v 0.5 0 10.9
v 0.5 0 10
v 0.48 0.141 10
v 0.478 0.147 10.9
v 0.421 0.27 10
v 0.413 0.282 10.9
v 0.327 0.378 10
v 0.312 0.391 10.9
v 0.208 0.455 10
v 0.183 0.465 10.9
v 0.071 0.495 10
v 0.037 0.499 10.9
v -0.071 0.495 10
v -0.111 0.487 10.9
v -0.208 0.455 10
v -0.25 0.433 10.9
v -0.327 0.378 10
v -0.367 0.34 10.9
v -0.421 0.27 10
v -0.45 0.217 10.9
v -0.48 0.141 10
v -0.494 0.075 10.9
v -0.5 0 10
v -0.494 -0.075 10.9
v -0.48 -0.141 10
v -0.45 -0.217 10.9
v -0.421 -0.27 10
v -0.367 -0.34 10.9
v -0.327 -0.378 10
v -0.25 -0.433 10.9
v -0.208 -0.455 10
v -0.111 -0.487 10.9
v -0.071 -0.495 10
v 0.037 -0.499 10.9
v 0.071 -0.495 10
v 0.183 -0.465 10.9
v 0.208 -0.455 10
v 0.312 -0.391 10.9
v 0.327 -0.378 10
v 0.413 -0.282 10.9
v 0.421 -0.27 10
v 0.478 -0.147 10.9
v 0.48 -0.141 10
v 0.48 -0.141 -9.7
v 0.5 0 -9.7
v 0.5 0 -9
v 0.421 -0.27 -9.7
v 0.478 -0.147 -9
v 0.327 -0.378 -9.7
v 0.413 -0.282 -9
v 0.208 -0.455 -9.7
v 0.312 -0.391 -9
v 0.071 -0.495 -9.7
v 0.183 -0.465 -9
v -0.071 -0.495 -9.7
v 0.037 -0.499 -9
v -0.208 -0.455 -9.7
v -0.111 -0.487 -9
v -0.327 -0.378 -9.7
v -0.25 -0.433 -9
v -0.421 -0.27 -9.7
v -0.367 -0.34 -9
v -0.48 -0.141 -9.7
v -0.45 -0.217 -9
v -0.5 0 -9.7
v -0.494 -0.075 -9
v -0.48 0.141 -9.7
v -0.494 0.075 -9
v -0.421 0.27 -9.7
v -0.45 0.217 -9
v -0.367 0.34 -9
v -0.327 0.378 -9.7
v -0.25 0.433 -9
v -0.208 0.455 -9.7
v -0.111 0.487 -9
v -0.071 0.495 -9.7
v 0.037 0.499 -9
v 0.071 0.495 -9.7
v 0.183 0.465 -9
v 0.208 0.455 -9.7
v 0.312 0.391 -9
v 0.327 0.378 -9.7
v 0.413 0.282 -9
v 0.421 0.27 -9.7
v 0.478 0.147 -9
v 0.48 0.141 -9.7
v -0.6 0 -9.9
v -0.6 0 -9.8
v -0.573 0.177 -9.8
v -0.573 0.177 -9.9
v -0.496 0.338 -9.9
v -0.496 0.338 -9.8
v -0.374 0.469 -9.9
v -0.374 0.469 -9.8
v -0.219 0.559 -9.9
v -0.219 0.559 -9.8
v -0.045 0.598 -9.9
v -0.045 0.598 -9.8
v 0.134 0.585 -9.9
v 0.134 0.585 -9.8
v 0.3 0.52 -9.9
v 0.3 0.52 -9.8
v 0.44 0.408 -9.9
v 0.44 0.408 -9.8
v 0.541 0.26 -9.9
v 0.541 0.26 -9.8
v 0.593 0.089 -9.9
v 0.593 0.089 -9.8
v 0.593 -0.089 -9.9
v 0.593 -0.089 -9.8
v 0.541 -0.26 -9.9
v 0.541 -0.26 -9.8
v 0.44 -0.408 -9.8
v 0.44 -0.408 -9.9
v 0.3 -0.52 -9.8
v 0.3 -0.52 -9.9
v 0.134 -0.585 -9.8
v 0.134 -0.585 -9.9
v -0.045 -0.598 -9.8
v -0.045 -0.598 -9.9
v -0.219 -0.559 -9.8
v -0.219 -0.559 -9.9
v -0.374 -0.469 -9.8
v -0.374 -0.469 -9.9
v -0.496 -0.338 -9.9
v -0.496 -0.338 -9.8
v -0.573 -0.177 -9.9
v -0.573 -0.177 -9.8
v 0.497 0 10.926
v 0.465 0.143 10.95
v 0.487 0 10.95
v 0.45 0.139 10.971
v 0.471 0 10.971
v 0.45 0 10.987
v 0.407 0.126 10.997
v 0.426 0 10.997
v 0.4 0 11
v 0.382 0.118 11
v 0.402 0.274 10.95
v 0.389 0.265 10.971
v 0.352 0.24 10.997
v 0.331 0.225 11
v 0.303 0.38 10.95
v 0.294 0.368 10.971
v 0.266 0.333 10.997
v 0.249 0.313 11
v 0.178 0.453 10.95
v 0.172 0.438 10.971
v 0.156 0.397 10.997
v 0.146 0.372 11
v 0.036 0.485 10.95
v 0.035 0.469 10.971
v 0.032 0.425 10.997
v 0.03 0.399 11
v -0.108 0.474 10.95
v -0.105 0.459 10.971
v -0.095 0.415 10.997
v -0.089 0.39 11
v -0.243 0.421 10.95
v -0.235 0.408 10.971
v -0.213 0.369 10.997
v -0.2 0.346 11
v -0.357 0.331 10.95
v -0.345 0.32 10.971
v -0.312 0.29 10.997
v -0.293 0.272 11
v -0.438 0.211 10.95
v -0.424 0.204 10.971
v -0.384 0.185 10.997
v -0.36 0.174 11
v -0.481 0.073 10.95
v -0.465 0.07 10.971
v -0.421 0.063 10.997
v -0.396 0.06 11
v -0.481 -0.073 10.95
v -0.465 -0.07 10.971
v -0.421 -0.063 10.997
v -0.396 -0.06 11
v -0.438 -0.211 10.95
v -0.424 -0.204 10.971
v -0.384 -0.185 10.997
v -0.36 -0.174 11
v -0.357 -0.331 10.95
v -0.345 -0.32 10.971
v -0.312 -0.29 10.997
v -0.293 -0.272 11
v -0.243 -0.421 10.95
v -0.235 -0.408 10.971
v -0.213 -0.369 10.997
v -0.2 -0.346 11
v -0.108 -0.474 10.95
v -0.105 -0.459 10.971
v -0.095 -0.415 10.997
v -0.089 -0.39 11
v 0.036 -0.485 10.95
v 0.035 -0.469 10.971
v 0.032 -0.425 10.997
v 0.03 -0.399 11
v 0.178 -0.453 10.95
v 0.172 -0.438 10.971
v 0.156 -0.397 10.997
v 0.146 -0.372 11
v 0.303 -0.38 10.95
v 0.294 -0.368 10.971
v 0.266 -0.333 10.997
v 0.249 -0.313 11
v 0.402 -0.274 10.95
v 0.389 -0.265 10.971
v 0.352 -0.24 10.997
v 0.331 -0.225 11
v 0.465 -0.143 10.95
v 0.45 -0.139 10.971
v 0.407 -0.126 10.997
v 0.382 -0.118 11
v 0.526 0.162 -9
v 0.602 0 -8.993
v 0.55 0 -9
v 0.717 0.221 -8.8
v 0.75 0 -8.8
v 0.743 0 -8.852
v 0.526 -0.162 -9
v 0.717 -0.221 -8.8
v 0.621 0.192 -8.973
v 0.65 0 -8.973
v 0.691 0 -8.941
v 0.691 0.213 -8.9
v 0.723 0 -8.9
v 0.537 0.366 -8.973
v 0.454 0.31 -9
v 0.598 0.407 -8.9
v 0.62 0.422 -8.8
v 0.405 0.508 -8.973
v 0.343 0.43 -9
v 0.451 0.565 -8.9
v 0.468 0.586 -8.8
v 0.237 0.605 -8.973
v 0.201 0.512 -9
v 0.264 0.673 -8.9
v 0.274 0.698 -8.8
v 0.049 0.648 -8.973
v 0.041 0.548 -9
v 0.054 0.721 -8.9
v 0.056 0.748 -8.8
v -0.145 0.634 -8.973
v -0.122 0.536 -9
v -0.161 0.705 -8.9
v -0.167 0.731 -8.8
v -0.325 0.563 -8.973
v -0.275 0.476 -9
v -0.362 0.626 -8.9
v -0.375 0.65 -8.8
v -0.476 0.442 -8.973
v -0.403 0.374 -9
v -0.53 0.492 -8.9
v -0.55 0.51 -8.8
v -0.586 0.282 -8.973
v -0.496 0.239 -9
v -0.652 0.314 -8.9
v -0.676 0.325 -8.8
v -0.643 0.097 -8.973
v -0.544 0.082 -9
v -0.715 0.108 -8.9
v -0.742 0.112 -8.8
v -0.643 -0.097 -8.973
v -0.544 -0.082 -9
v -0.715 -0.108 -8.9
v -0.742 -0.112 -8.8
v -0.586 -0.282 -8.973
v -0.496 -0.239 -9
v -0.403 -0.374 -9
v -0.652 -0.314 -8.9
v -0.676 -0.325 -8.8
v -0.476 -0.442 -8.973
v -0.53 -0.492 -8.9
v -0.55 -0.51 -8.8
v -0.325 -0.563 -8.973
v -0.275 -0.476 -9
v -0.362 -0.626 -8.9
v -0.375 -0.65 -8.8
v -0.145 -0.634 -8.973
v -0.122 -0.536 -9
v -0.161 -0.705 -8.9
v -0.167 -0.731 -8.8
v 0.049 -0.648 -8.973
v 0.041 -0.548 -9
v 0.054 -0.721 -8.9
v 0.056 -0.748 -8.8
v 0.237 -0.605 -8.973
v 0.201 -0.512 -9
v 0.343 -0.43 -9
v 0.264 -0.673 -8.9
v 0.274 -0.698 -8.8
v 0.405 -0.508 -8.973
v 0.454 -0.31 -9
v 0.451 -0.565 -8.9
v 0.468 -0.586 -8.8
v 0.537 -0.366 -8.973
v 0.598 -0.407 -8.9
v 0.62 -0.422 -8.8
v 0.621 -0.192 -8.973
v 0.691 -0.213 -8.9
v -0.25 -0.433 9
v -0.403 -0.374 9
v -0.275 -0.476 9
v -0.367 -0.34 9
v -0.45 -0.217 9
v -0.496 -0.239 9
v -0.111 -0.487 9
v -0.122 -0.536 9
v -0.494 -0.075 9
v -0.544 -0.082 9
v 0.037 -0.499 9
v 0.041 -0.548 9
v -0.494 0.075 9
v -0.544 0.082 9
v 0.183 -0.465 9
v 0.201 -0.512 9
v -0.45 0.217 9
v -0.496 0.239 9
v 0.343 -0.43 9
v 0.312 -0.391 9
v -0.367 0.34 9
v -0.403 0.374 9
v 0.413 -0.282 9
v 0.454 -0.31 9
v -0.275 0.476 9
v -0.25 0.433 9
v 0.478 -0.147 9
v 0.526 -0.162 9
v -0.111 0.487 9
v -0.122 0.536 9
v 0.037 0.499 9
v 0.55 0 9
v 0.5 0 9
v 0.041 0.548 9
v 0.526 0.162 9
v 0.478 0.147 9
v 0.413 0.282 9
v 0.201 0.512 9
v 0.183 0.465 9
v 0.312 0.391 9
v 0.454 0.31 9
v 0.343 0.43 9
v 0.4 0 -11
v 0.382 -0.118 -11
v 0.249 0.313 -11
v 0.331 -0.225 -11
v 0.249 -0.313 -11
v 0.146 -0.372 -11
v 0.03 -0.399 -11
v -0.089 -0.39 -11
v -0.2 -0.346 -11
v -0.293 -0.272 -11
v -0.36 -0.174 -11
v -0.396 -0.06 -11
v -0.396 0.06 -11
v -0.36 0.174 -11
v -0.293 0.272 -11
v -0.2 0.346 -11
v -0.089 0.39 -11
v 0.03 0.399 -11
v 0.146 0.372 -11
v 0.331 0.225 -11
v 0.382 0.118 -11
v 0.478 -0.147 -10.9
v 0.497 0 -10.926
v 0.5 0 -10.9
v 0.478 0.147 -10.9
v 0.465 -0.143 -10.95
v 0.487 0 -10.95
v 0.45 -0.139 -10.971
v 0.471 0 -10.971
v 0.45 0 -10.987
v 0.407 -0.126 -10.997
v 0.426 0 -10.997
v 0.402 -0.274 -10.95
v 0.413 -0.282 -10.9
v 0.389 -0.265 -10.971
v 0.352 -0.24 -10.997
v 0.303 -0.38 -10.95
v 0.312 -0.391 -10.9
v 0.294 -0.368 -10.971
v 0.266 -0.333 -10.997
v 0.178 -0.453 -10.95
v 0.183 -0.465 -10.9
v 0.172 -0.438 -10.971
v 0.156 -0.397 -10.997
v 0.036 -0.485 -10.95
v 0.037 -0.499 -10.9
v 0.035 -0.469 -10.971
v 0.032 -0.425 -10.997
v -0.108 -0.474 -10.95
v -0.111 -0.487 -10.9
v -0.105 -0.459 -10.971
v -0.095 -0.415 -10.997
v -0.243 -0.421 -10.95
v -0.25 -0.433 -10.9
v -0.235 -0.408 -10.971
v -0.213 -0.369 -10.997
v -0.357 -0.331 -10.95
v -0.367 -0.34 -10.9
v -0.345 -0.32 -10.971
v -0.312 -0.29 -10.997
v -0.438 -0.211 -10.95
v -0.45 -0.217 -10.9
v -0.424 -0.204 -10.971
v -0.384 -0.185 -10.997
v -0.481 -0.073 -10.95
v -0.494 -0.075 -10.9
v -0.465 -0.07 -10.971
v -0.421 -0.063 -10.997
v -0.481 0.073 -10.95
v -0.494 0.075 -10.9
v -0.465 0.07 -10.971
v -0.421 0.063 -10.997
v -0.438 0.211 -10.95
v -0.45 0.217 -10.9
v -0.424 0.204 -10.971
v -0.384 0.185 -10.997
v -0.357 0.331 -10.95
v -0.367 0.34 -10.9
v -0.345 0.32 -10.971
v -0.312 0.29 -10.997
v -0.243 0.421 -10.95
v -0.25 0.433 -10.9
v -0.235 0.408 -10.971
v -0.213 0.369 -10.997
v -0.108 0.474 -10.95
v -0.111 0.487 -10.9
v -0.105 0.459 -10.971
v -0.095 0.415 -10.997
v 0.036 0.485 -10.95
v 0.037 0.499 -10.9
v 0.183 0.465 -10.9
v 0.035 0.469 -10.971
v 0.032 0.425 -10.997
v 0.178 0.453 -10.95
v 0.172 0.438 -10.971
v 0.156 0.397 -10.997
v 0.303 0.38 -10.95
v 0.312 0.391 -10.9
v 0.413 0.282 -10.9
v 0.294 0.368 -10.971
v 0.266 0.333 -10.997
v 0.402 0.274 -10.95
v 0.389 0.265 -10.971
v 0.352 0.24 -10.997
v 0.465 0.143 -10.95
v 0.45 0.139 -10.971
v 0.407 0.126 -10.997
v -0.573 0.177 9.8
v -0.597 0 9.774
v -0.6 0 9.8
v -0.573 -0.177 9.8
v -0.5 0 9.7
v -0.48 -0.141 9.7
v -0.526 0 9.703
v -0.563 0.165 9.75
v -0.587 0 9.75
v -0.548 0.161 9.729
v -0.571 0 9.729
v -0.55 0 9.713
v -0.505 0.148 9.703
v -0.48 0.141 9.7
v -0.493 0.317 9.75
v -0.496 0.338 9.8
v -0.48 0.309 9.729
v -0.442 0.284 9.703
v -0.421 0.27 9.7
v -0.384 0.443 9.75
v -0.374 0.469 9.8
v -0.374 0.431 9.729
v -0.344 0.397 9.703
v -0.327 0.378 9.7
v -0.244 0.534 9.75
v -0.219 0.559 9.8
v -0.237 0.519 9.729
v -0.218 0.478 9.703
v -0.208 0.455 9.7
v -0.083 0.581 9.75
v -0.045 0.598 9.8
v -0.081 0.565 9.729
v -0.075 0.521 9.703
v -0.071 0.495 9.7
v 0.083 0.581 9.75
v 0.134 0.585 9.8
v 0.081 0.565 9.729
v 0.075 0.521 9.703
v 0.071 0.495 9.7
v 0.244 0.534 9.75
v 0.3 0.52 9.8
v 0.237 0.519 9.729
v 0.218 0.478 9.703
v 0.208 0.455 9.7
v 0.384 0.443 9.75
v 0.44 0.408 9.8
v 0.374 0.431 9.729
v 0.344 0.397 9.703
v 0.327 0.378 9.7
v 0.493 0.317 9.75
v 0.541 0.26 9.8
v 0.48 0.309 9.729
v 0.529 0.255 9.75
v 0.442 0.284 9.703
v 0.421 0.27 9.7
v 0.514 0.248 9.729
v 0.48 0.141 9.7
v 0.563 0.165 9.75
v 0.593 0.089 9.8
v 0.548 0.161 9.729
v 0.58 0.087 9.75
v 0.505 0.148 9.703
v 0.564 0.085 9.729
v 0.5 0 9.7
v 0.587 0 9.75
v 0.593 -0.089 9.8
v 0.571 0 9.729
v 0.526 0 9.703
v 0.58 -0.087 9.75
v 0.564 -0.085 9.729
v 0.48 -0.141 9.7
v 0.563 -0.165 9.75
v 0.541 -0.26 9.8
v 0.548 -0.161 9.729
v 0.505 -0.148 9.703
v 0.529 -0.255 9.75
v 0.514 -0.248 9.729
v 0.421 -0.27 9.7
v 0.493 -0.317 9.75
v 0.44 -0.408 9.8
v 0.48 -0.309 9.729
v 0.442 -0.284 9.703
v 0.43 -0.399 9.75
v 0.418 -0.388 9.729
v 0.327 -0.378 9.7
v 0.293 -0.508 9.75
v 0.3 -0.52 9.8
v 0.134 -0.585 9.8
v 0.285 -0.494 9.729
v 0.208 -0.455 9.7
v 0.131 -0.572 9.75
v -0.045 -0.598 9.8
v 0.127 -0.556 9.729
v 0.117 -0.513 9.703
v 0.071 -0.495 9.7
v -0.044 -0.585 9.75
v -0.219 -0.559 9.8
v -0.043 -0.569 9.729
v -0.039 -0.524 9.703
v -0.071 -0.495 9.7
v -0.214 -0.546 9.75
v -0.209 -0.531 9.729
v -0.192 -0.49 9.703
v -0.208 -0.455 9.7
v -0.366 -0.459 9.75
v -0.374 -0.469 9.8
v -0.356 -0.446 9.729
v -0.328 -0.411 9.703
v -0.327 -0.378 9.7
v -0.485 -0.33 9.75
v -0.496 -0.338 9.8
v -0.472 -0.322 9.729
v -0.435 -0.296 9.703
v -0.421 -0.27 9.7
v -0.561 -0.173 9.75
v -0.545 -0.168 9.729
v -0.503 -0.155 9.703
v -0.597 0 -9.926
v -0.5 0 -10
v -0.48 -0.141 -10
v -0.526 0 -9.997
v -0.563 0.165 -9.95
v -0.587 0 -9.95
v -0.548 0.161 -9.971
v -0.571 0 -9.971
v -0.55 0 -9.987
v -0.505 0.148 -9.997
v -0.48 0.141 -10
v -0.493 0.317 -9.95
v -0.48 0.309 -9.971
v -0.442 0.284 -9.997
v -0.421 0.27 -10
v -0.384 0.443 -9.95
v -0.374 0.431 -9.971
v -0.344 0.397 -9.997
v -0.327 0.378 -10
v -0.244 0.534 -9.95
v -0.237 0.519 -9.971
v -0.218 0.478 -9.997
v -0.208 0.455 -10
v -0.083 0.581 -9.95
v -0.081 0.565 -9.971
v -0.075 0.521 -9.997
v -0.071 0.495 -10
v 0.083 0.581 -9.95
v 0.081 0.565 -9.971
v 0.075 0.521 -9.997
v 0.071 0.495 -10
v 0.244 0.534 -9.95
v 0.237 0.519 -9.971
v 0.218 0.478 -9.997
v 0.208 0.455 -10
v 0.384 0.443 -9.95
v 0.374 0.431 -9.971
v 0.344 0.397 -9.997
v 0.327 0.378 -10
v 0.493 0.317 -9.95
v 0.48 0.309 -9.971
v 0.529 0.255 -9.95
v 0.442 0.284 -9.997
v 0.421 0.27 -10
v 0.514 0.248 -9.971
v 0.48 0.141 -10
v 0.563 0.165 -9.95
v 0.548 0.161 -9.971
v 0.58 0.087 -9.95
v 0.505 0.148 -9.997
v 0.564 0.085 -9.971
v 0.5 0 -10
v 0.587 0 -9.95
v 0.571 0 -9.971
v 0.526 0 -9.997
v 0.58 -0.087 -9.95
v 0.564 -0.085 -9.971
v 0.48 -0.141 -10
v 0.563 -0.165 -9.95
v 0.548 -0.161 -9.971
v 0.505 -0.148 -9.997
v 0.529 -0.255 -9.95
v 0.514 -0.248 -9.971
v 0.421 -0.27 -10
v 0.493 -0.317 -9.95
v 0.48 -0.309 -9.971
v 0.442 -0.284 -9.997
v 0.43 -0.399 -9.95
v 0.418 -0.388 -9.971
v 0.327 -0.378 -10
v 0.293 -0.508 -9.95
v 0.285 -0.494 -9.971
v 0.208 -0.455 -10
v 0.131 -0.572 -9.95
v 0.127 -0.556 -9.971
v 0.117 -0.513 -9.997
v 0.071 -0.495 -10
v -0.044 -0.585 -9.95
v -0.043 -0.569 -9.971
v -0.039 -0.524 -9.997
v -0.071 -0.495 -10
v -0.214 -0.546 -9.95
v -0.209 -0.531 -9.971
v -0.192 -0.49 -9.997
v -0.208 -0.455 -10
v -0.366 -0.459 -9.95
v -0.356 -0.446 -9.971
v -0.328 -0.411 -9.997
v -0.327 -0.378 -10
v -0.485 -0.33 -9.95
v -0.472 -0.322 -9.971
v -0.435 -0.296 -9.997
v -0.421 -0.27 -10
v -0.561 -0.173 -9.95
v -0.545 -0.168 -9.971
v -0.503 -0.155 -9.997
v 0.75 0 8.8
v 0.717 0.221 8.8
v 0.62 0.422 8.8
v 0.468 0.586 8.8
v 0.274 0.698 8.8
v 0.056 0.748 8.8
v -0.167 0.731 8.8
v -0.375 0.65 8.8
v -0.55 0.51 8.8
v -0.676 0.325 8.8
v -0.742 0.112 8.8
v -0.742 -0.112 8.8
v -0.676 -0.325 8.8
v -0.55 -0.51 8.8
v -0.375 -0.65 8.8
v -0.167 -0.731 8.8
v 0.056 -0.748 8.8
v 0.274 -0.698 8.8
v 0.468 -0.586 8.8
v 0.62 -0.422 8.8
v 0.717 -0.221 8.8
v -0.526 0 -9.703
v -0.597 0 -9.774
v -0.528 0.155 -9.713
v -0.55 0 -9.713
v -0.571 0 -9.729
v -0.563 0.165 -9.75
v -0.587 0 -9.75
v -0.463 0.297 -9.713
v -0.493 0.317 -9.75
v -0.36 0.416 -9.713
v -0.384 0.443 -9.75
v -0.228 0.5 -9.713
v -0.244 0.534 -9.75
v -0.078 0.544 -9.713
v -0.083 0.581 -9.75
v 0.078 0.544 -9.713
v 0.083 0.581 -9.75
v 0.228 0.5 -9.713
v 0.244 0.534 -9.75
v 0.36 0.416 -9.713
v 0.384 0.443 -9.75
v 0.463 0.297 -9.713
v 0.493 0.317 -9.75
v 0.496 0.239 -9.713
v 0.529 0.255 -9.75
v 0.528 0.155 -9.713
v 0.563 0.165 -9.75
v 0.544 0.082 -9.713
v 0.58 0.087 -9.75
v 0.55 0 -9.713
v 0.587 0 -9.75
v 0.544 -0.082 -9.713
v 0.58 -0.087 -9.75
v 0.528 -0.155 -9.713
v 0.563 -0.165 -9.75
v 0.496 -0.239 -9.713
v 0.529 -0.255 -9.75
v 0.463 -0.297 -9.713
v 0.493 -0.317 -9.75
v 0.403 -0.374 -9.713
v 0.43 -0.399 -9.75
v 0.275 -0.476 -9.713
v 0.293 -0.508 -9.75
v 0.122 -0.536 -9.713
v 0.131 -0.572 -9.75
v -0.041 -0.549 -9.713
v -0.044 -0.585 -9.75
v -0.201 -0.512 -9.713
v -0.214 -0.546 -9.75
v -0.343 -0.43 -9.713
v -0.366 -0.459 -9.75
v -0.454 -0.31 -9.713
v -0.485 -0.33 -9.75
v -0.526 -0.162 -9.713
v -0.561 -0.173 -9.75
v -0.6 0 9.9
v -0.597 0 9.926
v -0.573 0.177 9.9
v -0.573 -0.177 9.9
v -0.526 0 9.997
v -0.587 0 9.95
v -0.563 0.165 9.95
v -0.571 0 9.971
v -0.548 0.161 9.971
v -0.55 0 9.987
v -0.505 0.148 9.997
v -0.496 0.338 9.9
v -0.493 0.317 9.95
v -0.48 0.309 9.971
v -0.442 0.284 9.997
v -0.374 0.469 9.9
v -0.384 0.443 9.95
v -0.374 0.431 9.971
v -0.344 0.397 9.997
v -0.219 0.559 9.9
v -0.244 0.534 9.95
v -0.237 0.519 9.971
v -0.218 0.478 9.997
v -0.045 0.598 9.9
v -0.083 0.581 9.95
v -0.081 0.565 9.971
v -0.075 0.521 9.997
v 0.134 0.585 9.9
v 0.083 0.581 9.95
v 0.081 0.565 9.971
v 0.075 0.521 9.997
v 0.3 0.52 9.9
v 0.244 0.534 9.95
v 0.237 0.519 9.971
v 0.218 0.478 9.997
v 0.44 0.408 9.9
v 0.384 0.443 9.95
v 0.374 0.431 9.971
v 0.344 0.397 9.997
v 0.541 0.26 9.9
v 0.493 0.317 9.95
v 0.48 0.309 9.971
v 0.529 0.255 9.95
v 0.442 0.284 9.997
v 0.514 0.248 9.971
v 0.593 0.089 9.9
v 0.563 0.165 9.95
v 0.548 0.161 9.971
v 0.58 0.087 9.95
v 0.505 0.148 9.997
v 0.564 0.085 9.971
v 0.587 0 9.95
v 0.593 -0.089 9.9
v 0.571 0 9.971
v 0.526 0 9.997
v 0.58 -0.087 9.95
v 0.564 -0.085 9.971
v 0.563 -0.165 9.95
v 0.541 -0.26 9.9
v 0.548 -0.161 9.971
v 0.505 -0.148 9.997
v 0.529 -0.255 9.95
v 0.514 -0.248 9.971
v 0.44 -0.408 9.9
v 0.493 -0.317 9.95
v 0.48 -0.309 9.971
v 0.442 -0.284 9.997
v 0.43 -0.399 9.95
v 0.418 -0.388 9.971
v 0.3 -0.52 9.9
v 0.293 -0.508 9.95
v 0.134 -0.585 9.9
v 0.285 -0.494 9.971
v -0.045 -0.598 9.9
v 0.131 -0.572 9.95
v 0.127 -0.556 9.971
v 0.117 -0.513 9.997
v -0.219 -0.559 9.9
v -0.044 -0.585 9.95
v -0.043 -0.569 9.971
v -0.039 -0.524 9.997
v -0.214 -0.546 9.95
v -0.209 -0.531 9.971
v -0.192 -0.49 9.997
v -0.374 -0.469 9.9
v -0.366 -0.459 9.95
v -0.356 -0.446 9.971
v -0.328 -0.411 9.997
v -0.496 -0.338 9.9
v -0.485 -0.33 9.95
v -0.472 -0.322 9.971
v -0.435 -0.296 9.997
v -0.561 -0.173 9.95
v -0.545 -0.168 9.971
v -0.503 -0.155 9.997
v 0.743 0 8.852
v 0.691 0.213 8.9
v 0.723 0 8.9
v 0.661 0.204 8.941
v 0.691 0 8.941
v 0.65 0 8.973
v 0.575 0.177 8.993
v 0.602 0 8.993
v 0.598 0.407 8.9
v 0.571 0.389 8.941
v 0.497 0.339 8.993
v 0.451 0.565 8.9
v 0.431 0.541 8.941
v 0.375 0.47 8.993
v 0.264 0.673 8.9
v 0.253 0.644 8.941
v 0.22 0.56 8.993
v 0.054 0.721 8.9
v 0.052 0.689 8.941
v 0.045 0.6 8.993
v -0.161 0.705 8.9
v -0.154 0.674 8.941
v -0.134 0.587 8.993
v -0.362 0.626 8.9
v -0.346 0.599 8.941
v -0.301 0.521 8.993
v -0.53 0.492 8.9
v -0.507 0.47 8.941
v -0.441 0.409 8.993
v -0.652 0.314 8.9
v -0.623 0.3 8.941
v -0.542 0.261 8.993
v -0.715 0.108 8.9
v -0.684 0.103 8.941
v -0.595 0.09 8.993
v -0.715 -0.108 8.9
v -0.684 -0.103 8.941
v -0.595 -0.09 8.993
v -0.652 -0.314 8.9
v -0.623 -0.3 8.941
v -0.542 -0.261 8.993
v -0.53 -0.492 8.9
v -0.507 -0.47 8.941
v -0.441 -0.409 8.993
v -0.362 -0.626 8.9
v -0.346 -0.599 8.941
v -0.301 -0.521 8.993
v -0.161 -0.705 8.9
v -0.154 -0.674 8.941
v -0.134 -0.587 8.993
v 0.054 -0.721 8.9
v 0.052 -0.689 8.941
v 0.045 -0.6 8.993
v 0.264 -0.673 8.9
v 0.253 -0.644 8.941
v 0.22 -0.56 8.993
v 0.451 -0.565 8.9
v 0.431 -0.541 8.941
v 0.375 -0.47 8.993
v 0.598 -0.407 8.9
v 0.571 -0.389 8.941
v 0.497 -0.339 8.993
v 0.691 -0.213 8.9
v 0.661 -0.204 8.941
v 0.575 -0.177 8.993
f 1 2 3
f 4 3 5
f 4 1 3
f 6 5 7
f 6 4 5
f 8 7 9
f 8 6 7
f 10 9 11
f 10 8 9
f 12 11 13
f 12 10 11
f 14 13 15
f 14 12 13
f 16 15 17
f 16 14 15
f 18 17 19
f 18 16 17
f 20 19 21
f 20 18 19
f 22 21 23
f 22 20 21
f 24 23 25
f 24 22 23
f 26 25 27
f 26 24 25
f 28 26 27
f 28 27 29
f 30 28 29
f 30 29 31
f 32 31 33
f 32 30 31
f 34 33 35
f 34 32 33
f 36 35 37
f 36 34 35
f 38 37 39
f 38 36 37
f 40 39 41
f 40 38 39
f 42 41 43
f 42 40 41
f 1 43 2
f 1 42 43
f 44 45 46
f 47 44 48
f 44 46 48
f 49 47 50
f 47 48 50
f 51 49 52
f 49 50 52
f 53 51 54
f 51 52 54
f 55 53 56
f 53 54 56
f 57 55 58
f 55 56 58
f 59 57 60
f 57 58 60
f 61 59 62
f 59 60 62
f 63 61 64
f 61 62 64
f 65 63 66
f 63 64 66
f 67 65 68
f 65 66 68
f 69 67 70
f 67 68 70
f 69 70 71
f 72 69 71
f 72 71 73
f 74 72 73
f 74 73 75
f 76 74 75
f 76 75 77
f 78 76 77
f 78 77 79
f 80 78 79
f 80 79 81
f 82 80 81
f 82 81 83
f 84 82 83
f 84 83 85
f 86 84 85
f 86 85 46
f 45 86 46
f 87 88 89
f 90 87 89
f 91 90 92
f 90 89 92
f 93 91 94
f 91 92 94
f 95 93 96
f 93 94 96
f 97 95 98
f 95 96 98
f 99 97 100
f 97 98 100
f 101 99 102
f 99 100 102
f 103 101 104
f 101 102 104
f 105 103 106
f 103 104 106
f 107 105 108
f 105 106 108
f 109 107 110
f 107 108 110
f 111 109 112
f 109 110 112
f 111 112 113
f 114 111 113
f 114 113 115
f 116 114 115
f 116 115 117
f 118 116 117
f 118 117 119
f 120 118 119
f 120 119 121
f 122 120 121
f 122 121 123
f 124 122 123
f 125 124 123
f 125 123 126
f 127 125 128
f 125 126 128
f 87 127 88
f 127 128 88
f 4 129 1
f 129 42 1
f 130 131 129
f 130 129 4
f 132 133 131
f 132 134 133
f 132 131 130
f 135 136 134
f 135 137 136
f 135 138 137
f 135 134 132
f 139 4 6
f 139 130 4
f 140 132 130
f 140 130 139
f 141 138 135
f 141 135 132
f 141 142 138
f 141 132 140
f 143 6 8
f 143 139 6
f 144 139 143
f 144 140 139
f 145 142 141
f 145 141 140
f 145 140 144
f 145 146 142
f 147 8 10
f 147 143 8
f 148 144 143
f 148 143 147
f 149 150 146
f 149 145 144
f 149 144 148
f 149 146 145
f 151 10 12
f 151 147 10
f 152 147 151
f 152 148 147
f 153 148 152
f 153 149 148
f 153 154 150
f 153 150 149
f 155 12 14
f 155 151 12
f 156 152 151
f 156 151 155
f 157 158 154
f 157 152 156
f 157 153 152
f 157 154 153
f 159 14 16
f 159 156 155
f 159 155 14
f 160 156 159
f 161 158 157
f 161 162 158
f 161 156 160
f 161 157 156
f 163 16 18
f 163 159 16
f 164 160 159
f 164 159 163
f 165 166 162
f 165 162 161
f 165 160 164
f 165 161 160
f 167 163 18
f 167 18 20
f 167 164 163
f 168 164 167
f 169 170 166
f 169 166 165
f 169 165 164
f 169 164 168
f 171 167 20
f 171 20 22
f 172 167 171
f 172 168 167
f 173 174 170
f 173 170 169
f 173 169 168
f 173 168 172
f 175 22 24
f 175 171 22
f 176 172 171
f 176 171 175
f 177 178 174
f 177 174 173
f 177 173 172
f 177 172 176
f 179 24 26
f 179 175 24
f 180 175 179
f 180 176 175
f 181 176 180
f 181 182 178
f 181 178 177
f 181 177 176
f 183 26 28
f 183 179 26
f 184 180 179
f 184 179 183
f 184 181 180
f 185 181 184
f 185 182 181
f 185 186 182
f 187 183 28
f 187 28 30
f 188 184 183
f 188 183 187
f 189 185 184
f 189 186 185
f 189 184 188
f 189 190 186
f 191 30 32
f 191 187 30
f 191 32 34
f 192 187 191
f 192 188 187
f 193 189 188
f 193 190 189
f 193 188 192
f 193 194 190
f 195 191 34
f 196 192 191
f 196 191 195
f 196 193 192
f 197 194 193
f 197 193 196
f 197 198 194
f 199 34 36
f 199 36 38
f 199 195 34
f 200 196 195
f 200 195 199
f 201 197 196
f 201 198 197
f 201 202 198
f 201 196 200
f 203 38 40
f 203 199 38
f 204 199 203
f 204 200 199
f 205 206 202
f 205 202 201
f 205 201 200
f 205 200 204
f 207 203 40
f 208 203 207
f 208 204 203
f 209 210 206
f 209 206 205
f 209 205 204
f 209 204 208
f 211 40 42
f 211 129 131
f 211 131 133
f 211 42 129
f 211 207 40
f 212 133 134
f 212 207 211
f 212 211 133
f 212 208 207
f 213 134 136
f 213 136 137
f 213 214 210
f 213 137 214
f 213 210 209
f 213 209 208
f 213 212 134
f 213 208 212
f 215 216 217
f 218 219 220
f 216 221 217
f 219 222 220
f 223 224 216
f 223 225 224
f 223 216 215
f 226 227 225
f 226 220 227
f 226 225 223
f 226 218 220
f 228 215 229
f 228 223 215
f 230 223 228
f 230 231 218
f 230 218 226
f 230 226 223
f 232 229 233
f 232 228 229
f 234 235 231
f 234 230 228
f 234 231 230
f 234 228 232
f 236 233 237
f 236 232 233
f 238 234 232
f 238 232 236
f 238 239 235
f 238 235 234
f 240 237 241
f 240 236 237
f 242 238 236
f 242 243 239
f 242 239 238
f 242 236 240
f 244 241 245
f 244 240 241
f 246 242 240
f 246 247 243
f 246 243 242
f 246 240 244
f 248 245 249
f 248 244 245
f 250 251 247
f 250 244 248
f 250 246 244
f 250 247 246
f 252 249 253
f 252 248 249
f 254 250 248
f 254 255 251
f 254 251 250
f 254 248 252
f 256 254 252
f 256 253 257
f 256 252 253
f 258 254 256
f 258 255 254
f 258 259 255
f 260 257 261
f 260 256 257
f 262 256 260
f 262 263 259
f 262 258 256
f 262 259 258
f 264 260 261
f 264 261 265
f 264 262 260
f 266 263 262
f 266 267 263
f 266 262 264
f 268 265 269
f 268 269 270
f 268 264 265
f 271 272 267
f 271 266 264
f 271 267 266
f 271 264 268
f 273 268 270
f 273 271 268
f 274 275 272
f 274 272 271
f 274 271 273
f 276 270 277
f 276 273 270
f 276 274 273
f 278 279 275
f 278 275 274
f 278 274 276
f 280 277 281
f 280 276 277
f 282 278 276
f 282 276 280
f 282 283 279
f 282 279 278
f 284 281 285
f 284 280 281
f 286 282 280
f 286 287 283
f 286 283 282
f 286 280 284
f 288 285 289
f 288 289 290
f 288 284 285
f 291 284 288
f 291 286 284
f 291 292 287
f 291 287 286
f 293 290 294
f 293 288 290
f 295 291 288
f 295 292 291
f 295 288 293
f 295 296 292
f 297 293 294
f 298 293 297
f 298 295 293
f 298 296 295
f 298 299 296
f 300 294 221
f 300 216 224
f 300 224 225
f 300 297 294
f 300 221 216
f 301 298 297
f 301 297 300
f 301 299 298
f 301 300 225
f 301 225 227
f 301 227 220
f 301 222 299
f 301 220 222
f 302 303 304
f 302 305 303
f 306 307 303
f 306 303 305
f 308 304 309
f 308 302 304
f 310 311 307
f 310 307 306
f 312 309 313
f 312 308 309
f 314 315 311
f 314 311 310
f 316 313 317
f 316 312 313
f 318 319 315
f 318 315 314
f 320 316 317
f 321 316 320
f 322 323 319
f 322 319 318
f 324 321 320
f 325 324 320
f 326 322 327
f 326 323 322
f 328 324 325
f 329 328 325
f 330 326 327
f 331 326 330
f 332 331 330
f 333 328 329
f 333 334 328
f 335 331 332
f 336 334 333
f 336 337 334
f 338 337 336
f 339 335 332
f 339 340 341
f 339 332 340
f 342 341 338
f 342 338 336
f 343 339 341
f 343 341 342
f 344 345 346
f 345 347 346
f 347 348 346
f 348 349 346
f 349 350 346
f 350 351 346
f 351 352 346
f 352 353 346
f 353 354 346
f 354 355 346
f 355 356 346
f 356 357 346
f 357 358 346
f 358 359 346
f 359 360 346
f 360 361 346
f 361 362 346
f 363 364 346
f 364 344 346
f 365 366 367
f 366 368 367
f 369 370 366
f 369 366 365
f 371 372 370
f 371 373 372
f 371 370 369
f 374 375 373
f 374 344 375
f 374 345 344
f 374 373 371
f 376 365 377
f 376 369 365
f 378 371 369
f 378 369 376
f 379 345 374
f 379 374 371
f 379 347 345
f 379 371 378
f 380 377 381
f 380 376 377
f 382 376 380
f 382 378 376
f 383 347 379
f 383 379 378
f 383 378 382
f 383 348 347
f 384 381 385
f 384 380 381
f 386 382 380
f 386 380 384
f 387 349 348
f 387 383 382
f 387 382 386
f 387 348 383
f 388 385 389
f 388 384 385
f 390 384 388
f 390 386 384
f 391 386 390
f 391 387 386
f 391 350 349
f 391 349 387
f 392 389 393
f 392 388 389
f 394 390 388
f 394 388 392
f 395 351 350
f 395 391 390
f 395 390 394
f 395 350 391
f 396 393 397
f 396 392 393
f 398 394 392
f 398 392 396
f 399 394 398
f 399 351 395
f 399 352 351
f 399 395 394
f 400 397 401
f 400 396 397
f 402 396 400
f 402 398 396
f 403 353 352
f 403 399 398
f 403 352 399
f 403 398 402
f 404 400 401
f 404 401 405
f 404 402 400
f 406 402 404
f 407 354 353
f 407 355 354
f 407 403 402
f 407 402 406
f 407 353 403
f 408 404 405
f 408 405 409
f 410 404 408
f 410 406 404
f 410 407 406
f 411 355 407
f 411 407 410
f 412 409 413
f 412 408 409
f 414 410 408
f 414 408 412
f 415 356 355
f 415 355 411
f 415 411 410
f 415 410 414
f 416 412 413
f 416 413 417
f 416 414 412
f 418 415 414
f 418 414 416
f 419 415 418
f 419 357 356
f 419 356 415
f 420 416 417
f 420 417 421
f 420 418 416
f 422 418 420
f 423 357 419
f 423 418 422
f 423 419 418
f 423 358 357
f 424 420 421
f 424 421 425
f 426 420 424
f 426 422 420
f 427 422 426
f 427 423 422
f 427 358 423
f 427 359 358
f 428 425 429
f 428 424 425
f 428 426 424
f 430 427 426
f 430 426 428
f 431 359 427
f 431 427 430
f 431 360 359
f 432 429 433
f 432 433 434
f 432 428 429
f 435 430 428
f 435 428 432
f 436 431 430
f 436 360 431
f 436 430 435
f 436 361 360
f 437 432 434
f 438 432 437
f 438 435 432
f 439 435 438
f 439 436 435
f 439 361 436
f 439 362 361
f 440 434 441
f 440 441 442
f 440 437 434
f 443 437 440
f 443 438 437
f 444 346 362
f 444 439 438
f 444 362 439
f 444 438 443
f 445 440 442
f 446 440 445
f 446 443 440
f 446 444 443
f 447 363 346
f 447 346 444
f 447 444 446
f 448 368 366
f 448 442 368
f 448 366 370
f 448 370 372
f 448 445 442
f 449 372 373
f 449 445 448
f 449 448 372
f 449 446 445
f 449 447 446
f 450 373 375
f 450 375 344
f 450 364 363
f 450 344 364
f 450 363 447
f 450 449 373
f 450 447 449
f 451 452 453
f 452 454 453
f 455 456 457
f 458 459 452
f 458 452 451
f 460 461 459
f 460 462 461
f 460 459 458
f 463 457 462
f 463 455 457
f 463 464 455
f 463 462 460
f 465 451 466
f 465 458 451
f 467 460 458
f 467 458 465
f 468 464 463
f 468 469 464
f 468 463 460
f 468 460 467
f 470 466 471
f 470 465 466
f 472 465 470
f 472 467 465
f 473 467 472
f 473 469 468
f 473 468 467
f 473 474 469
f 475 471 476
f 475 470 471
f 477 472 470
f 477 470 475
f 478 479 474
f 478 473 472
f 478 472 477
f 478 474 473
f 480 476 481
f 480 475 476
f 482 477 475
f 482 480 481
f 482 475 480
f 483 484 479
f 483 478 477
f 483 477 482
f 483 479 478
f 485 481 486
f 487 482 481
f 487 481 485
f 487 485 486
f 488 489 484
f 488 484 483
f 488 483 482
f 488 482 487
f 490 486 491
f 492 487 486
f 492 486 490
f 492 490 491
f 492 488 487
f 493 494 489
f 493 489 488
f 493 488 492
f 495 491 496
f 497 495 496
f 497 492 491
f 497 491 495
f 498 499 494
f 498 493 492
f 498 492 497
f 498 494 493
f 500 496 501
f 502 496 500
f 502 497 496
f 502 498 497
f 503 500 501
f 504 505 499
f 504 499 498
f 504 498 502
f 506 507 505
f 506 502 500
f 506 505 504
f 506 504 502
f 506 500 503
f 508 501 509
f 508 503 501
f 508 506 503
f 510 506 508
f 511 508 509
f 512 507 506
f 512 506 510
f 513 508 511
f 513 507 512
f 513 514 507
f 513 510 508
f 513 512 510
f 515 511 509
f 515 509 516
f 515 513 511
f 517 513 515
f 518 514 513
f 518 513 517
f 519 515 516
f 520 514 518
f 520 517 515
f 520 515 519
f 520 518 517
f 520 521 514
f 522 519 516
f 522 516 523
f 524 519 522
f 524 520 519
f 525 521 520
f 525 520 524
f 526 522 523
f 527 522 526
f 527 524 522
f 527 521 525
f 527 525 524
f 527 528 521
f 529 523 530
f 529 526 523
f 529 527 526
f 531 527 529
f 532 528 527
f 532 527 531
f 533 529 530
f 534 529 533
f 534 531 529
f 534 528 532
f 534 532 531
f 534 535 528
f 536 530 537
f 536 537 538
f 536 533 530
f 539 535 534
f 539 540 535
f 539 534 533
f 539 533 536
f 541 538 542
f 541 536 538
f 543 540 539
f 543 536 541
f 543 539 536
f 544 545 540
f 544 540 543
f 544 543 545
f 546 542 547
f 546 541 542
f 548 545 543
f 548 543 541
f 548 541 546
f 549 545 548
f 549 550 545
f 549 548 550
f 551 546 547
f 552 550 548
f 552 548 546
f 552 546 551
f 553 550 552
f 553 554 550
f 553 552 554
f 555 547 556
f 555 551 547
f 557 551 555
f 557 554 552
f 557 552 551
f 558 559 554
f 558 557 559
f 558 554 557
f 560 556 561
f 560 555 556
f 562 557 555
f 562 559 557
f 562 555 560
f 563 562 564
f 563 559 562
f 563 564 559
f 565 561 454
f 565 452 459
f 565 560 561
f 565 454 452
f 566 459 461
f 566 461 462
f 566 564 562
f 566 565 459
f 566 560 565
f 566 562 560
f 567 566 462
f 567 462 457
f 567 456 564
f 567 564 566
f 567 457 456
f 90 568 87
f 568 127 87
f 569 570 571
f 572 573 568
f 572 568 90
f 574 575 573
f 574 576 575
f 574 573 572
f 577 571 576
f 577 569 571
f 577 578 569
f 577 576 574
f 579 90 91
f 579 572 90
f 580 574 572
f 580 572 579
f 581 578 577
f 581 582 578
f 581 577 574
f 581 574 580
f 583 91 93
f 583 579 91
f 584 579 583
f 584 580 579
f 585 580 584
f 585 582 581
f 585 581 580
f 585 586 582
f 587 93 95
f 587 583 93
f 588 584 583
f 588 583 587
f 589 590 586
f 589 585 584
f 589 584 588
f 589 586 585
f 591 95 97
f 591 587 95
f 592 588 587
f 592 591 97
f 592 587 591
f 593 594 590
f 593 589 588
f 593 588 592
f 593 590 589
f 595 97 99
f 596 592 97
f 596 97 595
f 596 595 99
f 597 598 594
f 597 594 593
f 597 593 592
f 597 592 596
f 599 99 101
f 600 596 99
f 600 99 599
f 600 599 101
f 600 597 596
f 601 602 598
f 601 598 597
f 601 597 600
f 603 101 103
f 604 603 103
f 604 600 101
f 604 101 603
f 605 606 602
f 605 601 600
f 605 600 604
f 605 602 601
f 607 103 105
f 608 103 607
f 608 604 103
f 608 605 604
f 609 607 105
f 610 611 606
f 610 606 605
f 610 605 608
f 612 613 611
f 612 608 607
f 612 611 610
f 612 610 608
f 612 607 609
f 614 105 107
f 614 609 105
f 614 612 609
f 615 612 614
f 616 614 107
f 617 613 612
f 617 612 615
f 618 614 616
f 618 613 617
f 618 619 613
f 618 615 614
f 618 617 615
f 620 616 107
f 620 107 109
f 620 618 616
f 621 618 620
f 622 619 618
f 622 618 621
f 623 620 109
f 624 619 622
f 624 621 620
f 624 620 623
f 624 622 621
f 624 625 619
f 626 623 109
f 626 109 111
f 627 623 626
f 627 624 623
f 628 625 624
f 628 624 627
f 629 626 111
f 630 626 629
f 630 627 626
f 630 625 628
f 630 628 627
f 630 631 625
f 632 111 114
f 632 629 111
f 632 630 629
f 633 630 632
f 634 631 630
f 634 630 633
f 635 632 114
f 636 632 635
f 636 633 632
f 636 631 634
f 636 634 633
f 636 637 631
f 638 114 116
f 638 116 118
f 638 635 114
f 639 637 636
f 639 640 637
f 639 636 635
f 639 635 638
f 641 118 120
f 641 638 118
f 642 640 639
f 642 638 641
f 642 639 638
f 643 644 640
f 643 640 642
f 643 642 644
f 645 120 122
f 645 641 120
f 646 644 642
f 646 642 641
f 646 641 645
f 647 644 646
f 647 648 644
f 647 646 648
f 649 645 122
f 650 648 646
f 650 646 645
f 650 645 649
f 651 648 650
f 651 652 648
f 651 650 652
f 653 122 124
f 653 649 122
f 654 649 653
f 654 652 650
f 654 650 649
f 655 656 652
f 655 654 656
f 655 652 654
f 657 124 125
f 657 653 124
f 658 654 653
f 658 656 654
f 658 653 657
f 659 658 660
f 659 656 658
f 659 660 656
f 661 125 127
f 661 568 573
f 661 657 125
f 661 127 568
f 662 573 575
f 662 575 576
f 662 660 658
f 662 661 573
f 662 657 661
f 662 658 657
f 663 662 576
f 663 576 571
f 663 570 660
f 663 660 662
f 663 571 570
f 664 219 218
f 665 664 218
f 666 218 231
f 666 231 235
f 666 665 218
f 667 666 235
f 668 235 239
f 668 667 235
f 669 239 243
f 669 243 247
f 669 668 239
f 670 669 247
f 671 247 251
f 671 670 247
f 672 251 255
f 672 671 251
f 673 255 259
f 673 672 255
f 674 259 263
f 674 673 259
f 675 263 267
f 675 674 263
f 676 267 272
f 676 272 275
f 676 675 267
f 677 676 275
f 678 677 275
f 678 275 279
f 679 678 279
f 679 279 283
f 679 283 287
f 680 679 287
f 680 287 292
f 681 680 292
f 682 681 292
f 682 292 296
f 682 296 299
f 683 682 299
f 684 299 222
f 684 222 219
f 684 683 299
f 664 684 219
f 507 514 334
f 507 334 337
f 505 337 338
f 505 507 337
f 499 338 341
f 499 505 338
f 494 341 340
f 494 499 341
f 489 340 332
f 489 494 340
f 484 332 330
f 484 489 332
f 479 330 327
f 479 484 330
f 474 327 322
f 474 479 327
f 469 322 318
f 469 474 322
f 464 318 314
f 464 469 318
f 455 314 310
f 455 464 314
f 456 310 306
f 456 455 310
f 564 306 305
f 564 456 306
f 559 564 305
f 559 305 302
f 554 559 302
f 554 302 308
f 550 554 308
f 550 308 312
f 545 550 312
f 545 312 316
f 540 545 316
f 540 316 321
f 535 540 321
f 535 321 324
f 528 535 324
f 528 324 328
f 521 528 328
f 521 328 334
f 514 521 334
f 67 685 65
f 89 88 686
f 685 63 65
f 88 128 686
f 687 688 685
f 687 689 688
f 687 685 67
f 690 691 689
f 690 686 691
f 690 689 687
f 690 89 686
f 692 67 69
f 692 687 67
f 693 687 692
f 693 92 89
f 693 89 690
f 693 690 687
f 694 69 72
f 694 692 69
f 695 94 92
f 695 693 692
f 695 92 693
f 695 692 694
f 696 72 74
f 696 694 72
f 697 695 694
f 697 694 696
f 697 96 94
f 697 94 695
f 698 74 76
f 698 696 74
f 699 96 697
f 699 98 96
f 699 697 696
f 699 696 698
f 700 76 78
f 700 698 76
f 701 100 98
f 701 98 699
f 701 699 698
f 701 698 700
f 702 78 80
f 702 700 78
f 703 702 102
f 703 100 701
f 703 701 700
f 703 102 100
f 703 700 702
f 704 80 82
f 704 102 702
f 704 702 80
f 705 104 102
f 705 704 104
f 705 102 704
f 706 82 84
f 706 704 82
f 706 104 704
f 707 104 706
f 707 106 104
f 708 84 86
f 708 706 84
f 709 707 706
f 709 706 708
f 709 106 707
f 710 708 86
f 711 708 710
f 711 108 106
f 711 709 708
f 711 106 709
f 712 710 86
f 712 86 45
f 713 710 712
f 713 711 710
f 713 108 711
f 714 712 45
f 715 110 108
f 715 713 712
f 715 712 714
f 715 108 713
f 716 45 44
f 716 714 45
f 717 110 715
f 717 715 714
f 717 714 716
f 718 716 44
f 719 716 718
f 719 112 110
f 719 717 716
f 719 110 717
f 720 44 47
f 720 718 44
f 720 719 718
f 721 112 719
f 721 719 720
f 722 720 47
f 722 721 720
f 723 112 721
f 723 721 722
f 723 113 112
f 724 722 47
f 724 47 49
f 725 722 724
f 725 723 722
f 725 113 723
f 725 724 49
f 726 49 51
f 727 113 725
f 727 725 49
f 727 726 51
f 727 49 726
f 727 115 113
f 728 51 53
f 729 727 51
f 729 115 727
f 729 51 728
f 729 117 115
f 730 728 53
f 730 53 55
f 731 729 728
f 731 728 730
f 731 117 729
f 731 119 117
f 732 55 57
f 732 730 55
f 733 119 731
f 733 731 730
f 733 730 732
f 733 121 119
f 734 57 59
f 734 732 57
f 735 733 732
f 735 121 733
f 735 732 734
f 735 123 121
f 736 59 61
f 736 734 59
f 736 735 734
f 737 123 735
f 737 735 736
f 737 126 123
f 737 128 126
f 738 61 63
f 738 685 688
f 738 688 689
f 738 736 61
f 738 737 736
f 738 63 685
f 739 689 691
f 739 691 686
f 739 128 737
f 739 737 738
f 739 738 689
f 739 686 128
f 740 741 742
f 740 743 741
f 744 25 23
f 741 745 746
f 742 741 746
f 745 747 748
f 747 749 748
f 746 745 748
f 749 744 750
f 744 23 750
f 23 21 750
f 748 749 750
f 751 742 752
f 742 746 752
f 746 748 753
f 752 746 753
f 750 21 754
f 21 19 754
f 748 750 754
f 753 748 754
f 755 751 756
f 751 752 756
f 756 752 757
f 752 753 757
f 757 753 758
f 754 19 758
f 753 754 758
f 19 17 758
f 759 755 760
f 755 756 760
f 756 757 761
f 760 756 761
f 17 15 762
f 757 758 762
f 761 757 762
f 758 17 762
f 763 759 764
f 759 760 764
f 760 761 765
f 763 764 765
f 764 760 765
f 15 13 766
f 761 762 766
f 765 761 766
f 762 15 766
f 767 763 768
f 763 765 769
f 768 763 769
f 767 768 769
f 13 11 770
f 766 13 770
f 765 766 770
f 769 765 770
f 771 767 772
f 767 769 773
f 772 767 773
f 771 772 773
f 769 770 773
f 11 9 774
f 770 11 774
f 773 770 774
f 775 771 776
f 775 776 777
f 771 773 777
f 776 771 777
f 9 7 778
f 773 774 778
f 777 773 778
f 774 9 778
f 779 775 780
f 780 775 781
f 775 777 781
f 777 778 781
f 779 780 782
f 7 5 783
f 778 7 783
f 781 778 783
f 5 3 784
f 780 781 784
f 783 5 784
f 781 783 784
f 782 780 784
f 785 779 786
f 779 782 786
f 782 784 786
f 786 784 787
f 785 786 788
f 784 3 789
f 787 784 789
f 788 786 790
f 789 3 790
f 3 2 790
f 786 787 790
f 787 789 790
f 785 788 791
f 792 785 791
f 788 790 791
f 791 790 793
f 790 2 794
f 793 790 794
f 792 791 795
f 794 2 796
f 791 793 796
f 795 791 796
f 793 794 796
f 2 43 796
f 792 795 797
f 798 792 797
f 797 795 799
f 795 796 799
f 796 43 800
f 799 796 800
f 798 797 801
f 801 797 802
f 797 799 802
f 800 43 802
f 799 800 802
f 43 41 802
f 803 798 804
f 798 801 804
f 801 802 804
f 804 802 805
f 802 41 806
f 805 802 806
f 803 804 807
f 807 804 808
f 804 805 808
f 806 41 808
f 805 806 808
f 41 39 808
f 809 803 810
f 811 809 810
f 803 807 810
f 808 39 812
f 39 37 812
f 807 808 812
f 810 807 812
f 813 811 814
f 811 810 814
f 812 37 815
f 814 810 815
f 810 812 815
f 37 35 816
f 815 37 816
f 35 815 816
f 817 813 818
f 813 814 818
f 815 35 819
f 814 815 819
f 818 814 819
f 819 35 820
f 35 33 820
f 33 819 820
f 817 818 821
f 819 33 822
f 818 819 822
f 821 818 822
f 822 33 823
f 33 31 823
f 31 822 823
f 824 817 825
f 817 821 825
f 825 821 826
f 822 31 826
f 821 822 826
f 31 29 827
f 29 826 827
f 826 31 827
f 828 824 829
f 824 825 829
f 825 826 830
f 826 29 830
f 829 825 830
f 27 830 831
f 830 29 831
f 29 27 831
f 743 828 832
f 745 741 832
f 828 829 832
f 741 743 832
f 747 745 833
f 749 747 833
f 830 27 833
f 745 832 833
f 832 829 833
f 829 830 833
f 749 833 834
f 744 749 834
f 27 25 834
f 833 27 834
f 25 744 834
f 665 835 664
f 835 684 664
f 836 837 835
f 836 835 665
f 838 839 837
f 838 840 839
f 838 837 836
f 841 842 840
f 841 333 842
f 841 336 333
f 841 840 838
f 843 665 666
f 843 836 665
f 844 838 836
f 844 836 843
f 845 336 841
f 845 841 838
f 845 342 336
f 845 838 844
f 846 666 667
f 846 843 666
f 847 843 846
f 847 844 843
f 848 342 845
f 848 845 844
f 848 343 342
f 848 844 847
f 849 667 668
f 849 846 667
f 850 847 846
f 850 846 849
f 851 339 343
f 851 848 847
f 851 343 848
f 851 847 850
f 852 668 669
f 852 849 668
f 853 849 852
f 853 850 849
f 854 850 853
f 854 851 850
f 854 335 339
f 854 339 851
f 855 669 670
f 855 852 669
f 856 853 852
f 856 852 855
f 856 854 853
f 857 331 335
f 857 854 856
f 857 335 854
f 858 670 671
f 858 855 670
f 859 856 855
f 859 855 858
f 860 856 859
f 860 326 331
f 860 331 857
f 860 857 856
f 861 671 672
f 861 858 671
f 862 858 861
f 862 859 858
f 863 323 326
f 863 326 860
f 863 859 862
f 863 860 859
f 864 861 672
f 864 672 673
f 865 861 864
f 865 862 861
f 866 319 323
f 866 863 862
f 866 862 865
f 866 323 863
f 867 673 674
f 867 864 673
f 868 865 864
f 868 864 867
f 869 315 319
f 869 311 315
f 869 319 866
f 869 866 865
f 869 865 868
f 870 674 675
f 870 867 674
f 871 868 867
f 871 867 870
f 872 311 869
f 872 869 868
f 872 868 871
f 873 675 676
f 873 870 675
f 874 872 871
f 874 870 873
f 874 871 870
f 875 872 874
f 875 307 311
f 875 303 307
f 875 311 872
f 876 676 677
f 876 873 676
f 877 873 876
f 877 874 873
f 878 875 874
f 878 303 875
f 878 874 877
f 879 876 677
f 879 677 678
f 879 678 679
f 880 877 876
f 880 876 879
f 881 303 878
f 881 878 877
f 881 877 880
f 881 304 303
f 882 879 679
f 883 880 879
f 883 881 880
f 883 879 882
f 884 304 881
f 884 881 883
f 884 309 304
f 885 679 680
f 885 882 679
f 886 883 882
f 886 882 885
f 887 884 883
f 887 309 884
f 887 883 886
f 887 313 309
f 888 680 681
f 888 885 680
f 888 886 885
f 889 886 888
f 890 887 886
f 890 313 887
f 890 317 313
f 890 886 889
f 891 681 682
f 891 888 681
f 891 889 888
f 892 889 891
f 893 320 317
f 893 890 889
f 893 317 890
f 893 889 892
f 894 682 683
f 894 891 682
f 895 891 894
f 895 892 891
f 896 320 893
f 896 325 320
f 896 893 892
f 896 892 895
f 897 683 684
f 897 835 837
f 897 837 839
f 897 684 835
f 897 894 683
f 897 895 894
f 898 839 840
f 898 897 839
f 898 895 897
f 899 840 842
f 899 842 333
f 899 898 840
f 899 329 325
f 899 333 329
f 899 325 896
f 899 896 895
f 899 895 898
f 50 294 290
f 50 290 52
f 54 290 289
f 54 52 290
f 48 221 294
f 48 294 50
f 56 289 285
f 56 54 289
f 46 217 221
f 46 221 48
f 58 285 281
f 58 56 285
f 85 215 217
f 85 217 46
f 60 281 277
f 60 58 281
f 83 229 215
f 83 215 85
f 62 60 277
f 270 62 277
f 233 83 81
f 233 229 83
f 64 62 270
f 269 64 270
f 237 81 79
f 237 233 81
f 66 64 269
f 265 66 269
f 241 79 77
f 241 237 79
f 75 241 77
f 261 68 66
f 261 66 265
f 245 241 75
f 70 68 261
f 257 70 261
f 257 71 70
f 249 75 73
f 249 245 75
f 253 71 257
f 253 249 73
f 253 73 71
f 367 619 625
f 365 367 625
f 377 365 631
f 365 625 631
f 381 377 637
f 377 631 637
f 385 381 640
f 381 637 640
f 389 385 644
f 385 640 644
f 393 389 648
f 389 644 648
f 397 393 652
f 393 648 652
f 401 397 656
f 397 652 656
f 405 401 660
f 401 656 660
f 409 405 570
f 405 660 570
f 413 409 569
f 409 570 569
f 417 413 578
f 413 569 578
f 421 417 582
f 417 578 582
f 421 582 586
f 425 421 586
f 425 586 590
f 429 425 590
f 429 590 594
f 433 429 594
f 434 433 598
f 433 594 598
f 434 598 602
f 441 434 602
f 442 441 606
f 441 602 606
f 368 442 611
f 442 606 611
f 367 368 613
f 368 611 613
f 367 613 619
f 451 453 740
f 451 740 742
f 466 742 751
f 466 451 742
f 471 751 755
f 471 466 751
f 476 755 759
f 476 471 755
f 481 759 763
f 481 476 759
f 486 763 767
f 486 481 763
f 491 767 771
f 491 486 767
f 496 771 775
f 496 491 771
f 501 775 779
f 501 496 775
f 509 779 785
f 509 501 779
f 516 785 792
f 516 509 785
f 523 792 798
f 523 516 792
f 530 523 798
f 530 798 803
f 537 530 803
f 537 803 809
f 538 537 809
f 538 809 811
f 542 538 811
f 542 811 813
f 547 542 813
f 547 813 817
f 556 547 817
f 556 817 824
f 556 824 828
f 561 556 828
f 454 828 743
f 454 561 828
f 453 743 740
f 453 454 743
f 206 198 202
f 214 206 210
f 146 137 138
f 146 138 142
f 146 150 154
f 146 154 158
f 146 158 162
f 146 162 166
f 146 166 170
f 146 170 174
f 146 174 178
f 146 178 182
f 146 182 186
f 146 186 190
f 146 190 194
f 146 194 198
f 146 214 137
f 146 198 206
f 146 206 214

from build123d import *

# Parameters (mm, degrees)
SKETCH1_R           = 0.75
BOSS_EXTRUDE1_DEPTH = 11
SKETCH2_R           = 1.389423691
SKETCH2_R_2         = 0.5
CUT_EXTRUDE1_DEPTH  = 2
CUT_EXTRUDE2_START  = -2
SKETCH3_R           = 1.153055404
SKETCH3_R_2         = 0.5
CUT_EXTRUDE2_DEPTH  = 2
BOSS_EXTRUDE2_START = -1.3
SKETCH4_R           = 0.6
SKETCH4_R_2         = 0.5
BOSS_EXTRUDE2_DEPTH = 0.3
FILLET1_R           = 0.2
FILLET2_R           = 0.1
FILLET3_R           = 0.1


with BuildPart() as part:
    # Sketch1 → Boss-Extrude1 (new, symmetric)
    with BuildSketch(Plane.XY):
        Circle(SKETCH1_R)
    extrude(amount=BOSS_EXTRUDE1_DEPTH, both=True)

    # Sketch2 → Cut-Extrude1 (cut)
    with BuildSketch(Plane.XY.offset(11)):
        Circle(SKETCH2_R)
        Circle(SKETCH2_R_2, mode=Mode.SUBTRACT)
    extrude(amount=-CUT_EXTRUDE1_DEPTH, mode=Mode.SUBTRACT)

    # Sketch3 → Cut-Extrude2 (cut)
    with BuildSketch(Plane(origin=(0, 0, -11), x_dir=(-1, 0, 0), z_dir=(0, 0, -1)).offset(CUT_EXTRUDE2_START)):
        Circle(SKETCH3_R)
        with Locations(Location((0, 0, 0), (0, 0, 180))):
            Circle(SKETCH3_R_2, mode=Mode.SUBTRACT)
    extrude(amount=CUT_EXTRUDE2_DEPTH, mode=Mode.SUBTRACT)

    # Sketch4 → Boss-Extrude2 (add)
    with BuildSketch(Plane(origin=(0, 0, -11), x_dir=(-1, 0, 0), z_dir=(0, 0, -1)).offset(BOSS_EXTRUDE2_START)):
        Circle(SKETCH4_R)
        Circle(SKETCH4_R_2, mode=Mode.SUBTRACT)
    boss_extrude2 = extrude(amount=BOSS_EXTRUDE2_DEPTH)

    # Fillet1
    fillet1_edges = [part.edges().sort_by_distance(p)[0] for p in [
        (-0.75, 0, -9),
        (-0.75, 0, 9),
    ]]
    fillet(fillet1_edges, radius=FILLET1_R)

    # Fillet2
    fillet2_edges = [part.edges().sort_by_distance(p)[0] for p in [
        (-0.5, 0, -11),
        (0.6, 0, -9.7),
        (0.6, 0, -10),
    ]]
    fillet(fillet2_edges, radius=FILLET2_R - 0.0001)  # a hair under: the kernel refuses the full size

    # Mirror1: Boss-Extrude2 across plane
    add(boss_extrude2.mirror(Plane.XY))

    # Fillet3
    fillet3_edges = [part.edges().sort_by_distance(p)[0] for p in [
        (0.6, 0, 9.7),
        (0.6, 0, 10),
        (-0.5, 0, 11),
    ]]
    fillet(fillet3_edges, radius=FILLET3_R - 0.0001)  # a hair under: the kernel refuses the full size


solid = part.part
